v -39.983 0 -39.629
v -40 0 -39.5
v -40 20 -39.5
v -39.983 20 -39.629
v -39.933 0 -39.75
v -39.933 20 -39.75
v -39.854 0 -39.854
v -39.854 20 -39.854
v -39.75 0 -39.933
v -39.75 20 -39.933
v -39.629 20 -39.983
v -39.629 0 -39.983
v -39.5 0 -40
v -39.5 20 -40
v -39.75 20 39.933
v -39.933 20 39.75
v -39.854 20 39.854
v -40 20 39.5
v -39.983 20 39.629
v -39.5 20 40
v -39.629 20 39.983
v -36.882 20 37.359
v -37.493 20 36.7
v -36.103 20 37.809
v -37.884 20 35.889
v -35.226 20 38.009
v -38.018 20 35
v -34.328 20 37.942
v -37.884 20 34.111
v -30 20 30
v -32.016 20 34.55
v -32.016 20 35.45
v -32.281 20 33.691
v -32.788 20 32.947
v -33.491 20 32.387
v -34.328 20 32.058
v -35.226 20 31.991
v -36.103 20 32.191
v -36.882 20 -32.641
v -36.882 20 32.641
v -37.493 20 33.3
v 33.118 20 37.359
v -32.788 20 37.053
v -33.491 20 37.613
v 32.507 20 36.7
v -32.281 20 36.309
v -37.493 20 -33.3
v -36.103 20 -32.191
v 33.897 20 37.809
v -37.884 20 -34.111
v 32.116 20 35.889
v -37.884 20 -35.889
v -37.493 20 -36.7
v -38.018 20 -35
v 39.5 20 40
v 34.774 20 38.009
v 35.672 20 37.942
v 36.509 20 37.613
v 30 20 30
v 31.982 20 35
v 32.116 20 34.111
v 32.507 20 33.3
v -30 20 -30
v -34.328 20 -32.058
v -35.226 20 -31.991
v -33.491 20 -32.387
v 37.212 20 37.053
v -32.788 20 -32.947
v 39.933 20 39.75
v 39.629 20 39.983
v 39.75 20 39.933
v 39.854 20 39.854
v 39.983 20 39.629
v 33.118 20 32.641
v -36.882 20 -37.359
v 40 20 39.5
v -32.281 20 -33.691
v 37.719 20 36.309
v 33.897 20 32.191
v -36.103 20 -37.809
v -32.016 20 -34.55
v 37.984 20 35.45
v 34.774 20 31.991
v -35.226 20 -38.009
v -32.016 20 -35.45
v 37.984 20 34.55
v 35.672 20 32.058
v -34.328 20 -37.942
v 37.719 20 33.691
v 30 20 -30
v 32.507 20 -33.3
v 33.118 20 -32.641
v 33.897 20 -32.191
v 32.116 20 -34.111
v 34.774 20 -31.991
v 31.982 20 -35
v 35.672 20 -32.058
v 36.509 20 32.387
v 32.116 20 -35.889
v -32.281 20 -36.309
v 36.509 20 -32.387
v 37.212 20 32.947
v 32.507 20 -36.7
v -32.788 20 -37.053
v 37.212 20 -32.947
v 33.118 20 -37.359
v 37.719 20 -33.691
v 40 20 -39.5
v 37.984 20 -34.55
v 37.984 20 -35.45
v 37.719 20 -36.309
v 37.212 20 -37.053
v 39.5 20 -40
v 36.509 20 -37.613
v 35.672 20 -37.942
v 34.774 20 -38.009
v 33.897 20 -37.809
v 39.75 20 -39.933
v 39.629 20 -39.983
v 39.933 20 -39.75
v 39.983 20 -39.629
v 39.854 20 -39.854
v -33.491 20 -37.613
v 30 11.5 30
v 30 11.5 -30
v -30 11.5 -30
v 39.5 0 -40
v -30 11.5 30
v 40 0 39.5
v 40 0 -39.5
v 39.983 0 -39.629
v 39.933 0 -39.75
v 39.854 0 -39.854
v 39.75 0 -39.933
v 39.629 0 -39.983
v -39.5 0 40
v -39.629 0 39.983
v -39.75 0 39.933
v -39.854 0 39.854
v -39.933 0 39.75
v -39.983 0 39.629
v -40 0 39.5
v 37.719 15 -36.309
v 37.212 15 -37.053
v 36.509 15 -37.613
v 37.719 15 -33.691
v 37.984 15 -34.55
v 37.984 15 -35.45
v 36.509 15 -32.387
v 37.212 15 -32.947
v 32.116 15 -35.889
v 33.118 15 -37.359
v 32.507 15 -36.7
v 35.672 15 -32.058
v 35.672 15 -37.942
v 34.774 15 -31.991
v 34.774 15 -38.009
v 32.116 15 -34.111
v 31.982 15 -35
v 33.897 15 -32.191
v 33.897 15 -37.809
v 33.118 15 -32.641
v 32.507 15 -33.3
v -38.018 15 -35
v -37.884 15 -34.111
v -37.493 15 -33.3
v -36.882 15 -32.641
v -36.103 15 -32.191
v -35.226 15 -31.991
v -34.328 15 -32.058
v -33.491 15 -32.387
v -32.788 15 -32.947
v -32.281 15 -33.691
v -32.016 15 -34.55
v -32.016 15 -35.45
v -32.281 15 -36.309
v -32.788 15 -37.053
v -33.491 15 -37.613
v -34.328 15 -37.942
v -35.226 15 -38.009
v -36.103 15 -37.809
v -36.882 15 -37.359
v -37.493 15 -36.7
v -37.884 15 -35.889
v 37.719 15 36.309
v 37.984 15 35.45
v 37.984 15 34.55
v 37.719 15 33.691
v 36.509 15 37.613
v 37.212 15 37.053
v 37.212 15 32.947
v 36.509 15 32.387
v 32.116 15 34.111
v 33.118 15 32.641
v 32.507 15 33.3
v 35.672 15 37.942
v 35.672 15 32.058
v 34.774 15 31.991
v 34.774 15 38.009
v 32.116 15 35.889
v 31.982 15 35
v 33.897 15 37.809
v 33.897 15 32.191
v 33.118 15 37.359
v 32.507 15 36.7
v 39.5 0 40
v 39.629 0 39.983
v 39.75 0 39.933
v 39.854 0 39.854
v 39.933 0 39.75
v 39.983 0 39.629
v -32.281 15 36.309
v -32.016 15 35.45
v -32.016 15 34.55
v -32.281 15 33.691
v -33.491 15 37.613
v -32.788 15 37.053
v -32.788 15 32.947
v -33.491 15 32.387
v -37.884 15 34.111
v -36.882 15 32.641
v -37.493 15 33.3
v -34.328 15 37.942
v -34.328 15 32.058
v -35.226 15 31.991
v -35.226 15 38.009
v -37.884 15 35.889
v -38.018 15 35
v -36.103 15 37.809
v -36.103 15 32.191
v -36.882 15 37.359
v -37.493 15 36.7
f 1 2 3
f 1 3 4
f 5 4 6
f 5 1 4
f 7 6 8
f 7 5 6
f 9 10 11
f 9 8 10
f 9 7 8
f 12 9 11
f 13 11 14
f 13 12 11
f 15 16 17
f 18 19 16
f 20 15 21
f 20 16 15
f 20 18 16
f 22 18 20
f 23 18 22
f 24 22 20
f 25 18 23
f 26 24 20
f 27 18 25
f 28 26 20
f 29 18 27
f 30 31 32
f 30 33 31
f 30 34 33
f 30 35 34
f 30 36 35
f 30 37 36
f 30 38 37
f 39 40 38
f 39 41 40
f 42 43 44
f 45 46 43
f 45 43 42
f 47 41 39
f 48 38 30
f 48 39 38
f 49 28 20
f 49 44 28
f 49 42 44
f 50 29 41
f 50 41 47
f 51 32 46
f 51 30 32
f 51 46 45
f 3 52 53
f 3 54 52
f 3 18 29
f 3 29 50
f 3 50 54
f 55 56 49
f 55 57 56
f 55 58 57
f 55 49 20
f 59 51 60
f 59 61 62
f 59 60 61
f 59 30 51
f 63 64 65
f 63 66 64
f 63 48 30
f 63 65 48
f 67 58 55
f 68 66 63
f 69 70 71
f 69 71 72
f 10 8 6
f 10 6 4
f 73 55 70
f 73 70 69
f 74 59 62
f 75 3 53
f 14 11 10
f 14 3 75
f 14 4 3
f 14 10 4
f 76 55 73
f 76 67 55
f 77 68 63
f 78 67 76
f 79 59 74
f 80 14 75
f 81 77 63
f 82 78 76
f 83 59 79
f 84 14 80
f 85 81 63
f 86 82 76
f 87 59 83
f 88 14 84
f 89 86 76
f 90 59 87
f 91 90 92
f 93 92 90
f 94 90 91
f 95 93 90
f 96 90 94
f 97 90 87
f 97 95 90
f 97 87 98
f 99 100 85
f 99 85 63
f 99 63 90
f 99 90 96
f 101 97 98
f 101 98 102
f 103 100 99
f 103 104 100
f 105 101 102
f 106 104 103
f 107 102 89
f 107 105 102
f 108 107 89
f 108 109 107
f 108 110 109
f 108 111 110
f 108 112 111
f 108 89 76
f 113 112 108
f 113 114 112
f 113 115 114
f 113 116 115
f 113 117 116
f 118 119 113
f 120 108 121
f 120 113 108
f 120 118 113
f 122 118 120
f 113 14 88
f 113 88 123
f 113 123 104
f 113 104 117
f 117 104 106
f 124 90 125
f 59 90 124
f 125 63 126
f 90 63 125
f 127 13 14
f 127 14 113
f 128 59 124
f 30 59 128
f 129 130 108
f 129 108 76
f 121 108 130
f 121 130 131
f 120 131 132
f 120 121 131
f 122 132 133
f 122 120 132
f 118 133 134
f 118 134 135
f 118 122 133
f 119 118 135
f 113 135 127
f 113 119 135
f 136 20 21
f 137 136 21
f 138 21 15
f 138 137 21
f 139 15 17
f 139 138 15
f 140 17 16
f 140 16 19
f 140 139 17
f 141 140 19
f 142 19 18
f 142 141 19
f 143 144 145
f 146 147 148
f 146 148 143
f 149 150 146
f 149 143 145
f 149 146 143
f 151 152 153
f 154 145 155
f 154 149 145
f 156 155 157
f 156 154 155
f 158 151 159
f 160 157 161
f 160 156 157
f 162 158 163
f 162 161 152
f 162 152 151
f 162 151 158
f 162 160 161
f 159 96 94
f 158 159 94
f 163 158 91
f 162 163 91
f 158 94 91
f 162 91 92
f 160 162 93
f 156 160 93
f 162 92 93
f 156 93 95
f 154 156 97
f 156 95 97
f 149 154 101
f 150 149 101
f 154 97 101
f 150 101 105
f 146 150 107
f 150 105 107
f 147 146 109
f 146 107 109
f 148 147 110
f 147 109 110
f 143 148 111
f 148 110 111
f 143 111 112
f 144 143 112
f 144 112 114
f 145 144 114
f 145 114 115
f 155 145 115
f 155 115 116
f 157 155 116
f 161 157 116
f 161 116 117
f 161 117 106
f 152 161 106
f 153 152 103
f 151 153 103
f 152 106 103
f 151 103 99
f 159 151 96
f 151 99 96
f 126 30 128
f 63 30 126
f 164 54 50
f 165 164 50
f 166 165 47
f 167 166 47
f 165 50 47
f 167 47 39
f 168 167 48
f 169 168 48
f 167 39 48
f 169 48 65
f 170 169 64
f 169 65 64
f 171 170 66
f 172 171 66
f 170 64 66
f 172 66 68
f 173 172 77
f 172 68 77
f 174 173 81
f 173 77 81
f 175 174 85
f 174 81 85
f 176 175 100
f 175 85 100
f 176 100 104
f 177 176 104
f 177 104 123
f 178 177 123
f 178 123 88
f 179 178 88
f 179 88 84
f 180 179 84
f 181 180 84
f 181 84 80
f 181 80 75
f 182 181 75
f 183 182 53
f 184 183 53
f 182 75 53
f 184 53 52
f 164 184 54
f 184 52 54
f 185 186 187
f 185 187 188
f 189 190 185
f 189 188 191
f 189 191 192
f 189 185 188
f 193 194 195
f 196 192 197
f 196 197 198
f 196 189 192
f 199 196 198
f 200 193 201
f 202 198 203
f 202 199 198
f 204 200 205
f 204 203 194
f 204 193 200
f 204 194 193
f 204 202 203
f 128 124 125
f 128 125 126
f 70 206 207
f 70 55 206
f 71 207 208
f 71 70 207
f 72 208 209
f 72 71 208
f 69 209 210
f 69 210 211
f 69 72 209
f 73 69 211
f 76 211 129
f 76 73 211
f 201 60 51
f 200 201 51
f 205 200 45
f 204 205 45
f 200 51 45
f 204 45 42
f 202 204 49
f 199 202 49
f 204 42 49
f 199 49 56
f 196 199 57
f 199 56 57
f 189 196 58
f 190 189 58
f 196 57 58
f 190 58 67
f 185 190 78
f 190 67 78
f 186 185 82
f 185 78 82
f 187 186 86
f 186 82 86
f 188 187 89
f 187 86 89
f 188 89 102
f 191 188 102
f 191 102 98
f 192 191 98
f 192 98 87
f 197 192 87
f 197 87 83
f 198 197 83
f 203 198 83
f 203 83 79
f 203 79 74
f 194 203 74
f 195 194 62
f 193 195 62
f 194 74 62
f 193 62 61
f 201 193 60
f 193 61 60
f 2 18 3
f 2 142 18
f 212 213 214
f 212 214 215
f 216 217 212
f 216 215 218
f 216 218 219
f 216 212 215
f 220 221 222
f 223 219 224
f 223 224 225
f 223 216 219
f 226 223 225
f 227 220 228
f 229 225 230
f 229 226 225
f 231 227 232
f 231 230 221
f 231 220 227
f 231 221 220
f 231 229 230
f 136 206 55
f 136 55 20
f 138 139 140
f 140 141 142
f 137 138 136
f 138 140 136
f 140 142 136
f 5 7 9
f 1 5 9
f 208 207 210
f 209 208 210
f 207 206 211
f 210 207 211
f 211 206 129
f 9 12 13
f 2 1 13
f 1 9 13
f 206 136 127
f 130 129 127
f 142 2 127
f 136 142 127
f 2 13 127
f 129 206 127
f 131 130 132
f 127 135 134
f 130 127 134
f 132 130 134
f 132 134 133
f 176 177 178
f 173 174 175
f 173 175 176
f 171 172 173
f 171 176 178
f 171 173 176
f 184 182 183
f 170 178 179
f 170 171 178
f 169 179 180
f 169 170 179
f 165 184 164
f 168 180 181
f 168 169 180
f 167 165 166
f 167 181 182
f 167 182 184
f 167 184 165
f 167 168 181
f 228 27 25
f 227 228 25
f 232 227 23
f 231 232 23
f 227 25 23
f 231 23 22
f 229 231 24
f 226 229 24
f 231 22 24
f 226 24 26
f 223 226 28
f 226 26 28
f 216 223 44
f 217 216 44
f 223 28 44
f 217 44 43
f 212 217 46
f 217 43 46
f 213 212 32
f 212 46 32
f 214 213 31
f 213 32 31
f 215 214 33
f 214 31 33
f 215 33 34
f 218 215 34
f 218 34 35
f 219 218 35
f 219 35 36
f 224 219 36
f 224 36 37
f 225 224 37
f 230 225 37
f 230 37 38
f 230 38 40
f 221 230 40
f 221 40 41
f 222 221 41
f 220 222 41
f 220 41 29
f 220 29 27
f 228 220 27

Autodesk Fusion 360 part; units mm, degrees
sketch "Sketch1" plane through (0, 0, 0) normal (0, 1, 0) x (1, 0, 0)
  line L0 (40, -40) -> (-40, -40)
  line L1 (-40, -40) -> (-40, 40)
  line L2 (-40, 40) -> (40, 40)
  line L3 (40, 40) -> (40, -40)
  line L4 (40, -40) -> (-40, 40) construction
  line L5 (-40, -40) -> (40, 40) construction
  dimension "d1" = 80
  dimension "d2" = 80
extrude "Extrude1" add sketch "Sketch1" along normal blind 20
sketch "Sketch2" plane through (0, 20, 0) normal (0, 1, 0) x (-1, 0, 0)
  line L0 (-40, -40) -> (40, -40)
  line L1 (40, -40) -> (40, 40)
  line L2 (40, 40) -> (-40, 40)
  line L3 (-40, 40) -> (-40, -40)
  line L4 (40, -40) -> (35, -40)
  line L5 (-40, -40) -> (-35, -40)
  line L6 (40, -40) -> (40, -35)
  line L7 (-40, -40) -> (-40, -35)
  line L8 (40, 40) -> (40, 35)
  line L9 (40, 40) -> (35, 40)
  line L10 (-40, 40) -> (-40, 35)
  line L11 (-40, 40) -> (-35, 40)
  circle A0 centre (35, 35) radius 3.75
  circle A1 centre (-35, 35) radius 3.75
  circle A2 centre (35, -35) radius 3.75
  circle A3 centre (-35, -35) radius 3.75
  line L12 (-30, 30) -> (30, 30)
  line L13 (30, 30) -> (30, -30)
  line L14 (30, -30) -> (-30, -30)
  line L15 (-30, -30) -> (-30, 30)
  line L16 (-30, 30) -> (30, -30) construction
  line L17 (30, 30) -> (-30, -30) construction
  dimension "d5" = 5
  dimension "d6" = 5
  dimension "d7" = 5
  dimension "d8" = 5
  dimension "d9" = 5
  dimension "d10" = 5
  dimension "d11" = 5
  dimension "d12" = 5
  dimension "d13" = 7.5
  dimension "d14" = 7.5
  dimension "d15" = 7.5
  dimension "d16" = 7.5
  dimension "d25" = 60
  dimension "d26" = 60
extrude "Extrude6" cut sketch "Sketch2" against normal blind 8.5 contours L12 L13 L14 L15
extrude "Extrude2" cut sketch "Sketch2" against normal blind 5 contours A0
extrude "Extrude3" cut sketch "Sketch2" against normal blind 5 contours A2
extrude "Extrude4" cut sketch "Sketch2" against normal blind 5 contours A1
extrude "Extrude5" cut sketch "Sketch2" against normal blind 5 contours A3
thread "Thread1" "ISO Metric profile 7.0 M7x1 6H" major diameter 7.1472 minor diameter 6.0355 pitch 1 angle 60 resizes the face on face at (-38.7453, 16.6667, 34.8131)
thread "Thread2" "ISO Metric profile 7.0 M7x1 6H" major diameter 7.1472 minor diameter 6.0355 pitch 1 angle 60 resizes the face on face at (-38.7453, 16.6667, -35.1869)
thread "Thread3" "ISO Metric profile 7.0 M7x1 6H" major diameter 7.1472 minor diameter 6.0355 pitch 1 angle 60 resizes the face on face at (31.2547, 16.6667, 34.8131)
thread "Thread4" "ISO Metric profile 7.0 M7x1 6H" major diameter 7.1472 minor diameter 6.0355 pitch 1 angle 60 resizes the face on face at (31.2547, 16.6667, -35.1869)
fillet "Fillet1" radius 0.5 1 edges at (40, 10, 40)
fillet "Fillet2" radius 0.5 1 edges at (-40, 10, 40)
fillet "Fillet3" radius 0.5 1 edges at (40, 10, -40)
fillet "Fillet4" radius 0.5 1 edges at (-40, 10, -40)
